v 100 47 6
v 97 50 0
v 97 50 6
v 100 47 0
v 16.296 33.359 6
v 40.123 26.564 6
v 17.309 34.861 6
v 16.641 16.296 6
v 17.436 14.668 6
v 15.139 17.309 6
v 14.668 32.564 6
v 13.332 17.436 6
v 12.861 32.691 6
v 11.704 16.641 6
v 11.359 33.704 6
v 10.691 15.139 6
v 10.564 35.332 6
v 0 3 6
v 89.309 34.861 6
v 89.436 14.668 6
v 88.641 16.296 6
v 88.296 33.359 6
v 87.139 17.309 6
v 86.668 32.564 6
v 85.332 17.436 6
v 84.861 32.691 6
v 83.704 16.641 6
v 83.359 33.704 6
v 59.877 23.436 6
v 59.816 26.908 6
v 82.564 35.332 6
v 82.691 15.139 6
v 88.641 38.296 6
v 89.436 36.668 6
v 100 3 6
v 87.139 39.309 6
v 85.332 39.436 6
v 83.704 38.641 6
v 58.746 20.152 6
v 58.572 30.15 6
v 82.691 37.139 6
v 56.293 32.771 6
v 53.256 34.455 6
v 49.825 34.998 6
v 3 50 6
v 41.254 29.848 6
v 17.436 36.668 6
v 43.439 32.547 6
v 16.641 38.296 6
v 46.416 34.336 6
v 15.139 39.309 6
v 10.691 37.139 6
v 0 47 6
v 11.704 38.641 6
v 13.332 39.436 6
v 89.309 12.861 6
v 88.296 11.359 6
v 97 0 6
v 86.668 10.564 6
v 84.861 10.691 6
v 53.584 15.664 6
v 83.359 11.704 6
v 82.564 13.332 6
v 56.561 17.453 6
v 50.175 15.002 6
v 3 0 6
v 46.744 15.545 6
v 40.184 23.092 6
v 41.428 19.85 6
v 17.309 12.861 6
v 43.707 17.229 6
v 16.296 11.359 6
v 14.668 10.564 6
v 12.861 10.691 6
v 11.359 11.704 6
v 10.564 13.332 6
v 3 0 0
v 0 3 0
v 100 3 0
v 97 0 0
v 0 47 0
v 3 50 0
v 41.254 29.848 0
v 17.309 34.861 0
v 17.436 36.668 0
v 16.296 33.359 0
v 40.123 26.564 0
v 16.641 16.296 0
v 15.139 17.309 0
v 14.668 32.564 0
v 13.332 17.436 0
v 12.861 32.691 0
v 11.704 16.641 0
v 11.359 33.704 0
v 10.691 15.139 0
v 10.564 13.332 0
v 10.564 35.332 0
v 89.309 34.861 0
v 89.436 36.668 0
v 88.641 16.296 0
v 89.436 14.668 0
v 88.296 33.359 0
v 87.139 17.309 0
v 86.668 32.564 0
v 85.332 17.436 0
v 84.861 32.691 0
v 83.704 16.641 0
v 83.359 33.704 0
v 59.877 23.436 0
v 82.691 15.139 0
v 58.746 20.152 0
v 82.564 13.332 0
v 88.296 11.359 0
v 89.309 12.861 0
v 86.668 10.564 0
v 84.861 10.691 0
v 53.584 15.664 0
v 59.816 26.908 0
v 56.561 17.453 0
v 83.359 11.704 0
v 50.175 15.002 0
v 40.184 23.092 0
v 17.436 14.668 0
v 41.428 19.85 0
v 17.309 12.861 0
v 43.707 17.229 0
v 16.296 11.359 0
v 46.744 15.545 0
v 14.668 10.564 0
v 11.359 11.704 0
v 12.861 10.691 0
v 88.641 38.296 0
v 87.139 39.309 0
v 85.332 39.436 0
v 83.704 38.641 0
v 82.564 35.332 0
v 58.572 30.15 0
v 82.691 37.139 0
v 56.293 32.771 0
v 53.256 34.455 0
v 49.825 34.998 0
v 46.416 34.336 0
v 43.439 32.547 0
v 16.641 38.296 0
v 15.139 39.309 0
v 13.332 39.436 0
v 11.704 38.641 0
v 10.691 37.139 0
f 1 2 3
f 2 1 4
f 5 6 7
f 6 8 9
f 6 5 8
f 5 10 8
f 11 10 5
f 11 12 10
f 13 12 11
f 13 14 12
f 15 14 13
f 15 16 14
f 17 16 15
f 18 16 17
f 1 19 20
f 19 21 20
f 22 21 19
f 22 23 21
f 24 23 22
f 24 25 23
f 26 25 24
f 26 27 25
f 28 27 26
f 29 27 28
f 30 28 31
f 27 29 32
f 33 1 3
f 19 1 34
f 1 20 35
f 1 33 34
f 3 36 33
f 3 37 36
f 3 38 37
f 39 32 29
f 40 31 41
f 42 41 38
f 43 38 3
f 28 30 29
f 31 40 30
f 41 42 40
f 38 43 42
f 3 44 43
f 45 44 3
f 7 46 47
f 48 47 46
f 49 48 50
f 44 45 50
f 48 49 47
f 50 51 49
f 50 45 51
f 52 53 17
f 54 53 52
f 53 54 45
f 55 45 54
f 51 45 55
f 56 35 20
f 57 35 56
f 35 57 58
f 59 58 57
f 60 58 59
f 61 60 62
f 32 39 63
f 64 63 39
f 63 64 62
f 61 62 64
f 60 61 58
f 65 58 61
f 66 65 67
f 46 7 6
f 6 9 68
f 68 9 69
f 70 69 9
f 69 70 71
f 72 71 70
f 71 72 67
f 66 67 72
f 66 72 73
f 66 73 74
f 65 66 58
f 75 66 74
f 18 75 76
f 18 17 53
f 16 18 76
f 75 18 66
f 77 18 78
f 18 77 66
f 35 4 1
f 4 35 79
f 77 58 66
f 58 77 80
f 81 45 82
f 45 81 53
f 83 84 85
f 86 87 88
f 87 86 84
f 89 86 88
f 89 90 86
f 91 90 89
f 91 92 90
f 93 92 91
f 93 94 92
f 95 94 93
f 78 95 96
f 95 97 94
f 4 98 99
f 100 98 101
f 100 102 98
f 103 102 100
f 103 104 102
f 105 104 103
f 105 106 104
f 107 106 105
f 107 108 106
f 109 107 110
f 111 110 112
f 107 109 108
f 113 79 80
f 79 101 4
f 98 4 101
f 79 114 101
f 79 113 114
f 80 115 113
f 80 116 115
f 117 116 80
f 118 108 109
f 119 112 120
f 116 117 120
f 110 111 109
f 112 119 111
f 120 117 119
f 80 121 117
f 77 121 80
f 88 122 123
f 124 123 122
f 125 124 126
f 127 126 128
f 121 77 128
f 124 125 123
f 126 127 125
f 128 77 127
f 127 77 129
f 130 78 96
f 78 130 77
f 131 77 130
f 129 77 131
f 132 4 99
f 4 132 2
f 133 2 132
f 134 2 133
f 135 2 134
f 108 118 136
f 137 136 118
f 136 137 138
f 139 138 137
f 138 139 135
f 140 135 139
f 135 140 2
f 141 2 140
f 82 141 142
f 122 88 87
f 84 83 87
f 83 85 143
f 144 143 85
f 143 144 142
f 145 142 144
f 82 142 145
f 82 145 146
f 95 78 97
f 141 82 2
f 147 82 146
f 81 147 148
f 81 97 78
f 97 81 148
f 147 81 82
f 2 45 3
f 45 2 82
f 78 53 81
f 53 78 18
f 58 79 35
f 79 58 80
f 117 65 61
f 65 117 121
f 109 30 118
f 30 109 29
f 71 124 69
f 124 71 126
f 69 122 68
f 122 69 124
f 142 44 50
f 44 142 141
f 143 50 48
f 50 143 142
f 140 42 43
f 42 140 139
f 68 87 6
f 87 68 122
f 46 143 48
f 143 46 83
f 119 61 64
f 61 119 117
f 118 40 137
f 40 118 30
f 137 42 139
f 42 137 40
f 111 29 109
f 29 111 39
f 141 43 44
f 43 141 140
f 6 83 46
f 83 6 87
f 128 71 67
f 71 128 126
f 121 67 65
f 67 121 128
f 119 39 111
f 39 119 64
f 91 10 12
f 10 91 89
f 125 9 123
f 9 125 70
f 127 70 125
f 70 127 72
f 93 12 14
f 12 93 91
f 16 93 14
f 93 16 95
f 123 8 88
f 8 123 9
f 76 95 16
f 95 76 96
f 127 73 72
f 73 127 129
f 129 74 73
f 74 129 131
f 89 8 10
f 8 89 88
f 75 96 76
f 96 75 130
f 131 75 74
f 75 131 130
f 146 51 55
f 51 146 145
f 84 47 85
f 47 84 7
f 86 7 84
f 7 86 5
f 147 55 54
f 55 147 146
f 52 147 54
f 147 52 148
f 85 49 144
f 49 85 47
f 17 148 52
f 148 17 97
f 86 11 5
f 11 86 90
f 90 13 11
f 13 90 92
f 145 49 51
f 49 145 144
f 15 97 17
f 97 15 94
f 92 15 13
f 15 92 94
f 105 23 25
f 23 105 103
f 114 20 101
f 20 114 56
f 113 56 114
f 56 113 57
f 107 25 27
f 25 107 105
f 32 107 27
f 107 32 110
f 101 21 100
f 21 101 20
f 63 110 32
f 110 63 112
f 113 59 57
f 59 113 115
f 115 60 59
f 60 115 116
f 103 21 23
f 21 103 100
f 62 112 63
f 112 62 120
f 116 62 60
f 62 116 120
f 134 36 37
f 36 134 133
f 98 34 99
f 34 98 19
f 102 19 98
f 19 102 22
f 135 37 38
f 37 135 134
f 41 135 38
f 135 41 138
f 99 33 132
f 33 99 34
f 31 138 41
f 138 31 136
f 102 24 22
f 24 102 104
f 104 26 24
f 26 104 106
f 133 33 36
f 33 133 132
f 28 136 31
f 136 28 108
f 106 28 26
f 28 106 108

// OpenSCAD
$fn = 32;

// ----------------------------------------------------------------------
// Spacer plate: rect 100 x 50
// ----------------------------------------------------------------------

// --- parameters (mm) ---
bore_r = 10;              // centre bore radius
bolt_r = 3.5;             // bolt hole radius
plate_t = 6;              // plate thickness, Z (extrusion height)
plate_l = 100;            // plate length, X
plate_w = 50;             // plate width, Y
inset = 14;               // corner hole inset

profile = [[3, 0], [97, 0], [100, 3], [100, 47], [97, 50], [3, 50], [0, 47], [0, 3]];  // primary outline, 8 points, counter clockwise
void_1 = [[59.816, 26.908], [58.572, 30.15], [56.293, 32.771], [53.256, 34.455], [49.825, 34.998], [46.416, 34.336], [43.439, 32.547], [41.254, 29.848], [40.123, 26.564], [40.184, 23.092], [41.428, 19.85], [43.707, 17.229], [46.744, 15.545], [50.175, 15.002], [53.584, 15.664], [56.561, 17.453], [58.746, 20.152], [59.877, 23.436]];  // centre bore, 18 points
void_2 = [[17.436, 14.668], [16.641, 16.296], [15.139, 17.309], [13.332, 17.436], [11.704, 16.641], [10.691, 15.139], [10.564, 13.332], [11.359, 11.704], [12.861, 10.691], [14.668, 10.564], [16.296, 11.359], [17.309, 12.861]];  // corner hole, 12 points
void_3 = [[17.436, 36.668], [16.641, 38.296], [15.139, 39.309], [13.332, 39.436], [11.704, 38.641], [10.691, 37.139], [10.564, 35.332], [11.359, 33.704], [12.861, 32.691], [14.668, 32.564], [16.296, 33.359], [17.309, 34.861]];  // corner hole, 12 points
void_4 = [[89.436, 14.668], [88.641, 16.296], [87.139, 17.309], [85.332, 17.436], [83.704, 16.641], [82.691, 15.139], [82.564, 13.332], [83.359, 11.704], [84.861, 10.691], [86.668, 10.564], [88.296, 11.359], [89.309, 12.861]];  // corner hole, 12 points
void_5 = [[89.436, 36.668], [88.641, 38.296], [87.139, 39.309], [85.332, 39.436], [83.704, 38.641], [82.691, 37.139], [82.564, 35.332], [83.359, 33.704], [84.861, 32.691], [86.668, 32.564], [88.296, 33.359], [89.309, 34.861]];  // corner hole, 12 points

// --- the one profile operation ---
difference() {
  linear_extrude(height = plate_t) polygon(points = profile);
  translate([0, 0, -1])
    linear_extrude(height = plate_t + 2) polygon(points = void_1);
  translate([0, 0, -1])
    linear_extrude(height = plate_t + 2) polygon(points = void_2);
  translate([0, 0, -1])
    linear_extrude(height = plate_t + 2) polygon(points = void_3);
  translate([0, 0, -1])
    linear_extrude(height = plate_t + 2) polygon(points = void_4);
  translate([0, 0, -1])
    linear_extrude(height = plate_t + 2) polygon(points = void_5);
}
